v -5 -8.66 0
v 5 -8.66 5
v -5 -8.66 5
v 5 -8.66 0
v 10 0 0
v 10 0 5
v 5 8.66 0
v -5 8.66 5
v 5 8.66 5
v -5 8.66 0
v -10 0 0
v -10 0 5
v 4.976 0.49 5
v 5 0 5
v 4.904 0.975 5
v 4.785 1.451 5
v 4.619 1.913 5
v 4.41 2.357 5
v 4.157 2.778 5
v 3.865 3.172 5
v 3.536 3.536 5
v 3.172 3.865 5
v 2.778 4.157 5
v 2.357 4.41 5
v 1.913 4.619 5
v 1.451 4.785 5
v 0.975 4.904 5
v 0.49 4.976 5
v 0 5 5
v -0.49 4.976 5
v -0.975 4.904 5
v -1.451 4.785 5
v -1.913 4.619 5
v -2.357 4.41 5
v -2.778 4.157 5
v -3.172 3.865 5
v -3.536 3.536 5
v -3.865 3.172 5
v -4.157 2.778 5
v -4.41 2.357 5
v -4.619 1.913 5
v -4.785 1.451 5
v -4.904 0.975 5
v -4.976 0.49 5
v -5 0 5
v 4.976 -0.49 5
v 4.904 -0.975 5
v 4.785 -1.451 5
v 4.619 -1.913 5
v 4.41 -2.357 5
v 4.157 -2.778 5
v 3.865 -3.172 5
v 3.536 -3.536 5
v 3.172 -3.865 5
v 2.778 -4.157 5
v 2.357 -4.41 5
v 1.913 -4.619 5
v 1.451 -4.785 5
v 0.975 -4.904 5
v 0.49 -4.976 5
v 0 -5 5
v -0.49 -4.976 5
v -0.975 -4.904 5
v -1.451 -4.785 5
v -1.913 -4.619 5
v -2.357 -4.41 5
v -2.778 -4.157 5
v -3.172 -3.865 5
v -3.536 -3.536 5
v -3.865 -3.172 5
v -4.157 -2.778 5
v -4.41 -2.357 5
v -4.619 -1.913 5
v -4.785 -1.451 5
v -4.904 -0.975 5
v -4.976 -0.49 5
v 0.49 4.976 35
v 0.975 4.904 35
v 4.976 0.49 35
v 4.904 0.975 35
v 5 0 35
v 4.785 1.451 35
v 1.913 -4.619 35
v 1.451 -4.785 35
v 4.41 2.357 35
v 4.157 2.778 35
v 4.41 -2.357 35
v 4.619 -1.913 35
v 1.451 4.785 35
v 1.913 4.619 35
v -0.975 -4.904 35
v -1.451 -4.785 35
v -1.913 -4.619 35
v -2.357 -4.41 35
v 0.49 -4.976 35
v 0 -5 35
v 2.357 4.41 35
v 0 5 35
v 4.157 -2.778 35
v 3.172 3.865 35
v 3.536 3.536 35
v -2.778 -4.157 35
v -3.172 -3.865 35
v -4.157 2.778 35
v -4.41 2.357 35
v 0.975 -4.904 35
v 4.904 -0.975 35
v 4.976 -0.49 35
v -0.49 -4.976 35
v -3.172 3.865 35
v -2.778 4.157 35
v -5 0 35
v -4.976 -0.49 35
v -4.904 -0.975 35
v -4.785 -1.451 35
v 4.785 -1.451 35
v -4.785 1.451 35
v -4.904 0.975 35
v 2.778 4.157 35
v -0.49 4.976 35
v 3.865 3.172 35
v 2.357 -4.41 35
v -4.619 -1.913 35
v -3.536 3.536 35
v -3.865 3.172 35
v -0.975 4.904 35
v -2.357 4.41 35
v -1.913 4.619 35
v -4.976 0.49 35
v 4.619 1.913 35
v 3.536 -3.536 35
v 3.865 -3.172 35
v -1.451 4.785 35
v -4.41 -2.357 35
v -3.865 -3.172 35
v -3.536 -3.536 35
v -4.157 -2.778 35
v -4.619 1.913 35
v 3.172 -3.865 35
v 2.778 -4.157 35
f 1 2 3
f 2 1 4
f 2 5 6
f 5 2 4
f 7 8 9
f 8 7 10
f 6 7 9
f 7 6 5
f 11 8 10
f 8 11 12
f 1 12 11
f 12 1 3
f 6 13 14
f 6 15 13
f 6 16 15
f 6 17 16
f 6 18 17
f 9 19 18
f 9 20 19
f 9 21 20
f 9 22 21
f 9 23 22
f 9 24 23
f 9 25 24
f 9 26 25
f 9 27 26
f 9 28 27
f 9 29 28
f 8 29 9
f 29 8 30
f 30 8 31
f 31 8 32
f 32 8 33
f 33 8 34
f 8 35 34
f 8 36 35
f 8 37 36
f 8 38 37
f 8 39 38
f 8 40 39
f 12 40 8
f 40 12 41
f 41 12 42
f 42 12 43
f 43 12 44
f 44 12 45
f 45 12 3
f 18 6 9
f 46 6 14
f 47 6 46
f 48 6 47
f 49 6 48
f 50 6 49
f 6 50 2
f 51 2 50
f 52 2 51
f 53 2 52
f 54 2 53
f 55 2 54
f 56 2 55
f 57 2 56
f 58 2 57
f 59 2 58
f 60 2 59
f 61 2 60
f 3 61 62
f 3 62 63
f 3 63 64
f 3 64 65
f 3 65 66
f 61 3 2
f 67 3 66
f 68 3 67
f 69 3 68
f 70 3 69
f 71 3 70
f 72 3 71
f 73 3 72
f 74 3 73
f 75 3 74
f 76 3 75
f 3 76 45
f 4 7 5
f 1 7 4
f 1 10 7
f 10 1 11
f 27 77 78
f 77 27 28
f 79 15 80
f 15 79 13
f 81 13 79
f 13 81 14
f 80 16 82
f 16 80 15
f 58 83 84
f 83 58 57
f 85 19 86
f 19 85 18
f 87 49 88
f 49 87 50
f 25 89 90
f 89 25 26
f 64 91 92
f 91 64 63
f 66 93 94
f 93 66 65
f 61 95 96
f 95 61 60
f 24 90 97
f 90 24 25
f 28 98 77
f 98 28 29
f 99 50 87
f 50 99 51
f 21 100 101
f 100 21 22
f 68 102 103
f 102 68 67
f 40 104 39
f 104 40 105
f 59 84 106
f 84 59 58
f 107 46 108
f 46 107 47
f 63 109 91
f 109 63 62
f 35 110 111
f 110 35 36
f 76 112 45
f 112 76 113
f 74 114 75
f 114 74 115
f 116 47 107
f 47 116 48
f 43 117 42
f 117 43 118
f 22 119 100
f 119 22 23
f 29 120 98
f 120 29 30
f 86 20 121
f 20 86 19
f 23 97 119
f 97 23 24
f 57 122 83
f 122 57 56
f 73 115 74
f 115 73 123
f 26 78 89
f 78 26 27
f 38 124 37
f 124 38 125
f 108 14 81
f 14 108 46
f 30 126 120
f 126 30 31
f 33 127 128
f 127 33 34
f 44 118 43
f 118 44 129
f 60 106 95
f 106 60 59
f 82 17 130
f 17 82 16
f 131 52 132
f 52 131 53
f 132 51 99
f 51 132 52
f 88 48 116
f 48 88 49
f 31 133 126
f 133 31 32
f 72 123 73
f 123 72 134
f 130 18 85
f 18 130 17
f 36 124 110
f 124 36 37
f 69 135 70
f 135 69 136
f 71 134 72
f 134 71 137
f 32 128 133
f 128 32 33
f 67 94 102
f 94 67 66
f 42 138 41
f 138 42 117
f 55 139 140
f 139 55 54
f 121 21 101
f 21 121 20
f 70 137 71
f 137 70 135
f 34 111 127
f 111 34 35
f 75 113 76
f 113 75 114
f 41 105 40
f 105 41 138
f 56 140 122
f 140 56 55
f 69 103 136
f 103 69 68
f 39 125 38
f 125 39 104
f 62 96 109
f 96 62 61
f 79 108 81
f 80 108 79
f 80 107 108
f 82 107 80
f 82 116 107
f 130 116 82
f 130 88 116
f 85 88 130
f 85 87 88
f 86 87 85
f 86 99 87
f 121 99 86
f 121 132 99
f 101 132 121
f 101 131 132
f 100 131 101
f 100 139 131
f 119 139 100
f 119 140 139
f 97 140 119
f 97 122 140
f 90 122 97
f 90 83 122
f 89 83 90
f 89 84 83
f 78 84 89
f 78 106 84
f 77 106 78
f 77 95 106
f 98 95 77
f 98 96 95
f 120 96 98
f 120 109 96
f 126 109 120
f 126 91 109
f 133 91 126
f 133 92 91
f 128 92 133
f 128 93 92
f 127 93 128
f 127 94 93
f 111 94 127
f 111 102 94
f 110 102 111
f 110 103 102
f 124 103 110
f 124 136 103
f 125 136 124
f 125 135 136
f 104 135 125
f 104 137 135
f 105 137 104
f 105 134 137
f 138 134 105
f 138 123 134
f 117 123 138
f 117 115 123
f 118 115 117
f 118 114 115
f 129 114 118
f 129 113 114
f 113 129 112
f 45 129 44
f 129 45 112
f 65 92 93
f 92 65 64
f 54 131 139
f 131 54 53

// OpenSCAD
union() {
	cylinder($fn = 6, h = 5.0, r = 10.0);
	translate(v = [0, 0, 5.0]) {
		cylinder($fn = 64, h = 30.0, r = 5.0);
	}
}
